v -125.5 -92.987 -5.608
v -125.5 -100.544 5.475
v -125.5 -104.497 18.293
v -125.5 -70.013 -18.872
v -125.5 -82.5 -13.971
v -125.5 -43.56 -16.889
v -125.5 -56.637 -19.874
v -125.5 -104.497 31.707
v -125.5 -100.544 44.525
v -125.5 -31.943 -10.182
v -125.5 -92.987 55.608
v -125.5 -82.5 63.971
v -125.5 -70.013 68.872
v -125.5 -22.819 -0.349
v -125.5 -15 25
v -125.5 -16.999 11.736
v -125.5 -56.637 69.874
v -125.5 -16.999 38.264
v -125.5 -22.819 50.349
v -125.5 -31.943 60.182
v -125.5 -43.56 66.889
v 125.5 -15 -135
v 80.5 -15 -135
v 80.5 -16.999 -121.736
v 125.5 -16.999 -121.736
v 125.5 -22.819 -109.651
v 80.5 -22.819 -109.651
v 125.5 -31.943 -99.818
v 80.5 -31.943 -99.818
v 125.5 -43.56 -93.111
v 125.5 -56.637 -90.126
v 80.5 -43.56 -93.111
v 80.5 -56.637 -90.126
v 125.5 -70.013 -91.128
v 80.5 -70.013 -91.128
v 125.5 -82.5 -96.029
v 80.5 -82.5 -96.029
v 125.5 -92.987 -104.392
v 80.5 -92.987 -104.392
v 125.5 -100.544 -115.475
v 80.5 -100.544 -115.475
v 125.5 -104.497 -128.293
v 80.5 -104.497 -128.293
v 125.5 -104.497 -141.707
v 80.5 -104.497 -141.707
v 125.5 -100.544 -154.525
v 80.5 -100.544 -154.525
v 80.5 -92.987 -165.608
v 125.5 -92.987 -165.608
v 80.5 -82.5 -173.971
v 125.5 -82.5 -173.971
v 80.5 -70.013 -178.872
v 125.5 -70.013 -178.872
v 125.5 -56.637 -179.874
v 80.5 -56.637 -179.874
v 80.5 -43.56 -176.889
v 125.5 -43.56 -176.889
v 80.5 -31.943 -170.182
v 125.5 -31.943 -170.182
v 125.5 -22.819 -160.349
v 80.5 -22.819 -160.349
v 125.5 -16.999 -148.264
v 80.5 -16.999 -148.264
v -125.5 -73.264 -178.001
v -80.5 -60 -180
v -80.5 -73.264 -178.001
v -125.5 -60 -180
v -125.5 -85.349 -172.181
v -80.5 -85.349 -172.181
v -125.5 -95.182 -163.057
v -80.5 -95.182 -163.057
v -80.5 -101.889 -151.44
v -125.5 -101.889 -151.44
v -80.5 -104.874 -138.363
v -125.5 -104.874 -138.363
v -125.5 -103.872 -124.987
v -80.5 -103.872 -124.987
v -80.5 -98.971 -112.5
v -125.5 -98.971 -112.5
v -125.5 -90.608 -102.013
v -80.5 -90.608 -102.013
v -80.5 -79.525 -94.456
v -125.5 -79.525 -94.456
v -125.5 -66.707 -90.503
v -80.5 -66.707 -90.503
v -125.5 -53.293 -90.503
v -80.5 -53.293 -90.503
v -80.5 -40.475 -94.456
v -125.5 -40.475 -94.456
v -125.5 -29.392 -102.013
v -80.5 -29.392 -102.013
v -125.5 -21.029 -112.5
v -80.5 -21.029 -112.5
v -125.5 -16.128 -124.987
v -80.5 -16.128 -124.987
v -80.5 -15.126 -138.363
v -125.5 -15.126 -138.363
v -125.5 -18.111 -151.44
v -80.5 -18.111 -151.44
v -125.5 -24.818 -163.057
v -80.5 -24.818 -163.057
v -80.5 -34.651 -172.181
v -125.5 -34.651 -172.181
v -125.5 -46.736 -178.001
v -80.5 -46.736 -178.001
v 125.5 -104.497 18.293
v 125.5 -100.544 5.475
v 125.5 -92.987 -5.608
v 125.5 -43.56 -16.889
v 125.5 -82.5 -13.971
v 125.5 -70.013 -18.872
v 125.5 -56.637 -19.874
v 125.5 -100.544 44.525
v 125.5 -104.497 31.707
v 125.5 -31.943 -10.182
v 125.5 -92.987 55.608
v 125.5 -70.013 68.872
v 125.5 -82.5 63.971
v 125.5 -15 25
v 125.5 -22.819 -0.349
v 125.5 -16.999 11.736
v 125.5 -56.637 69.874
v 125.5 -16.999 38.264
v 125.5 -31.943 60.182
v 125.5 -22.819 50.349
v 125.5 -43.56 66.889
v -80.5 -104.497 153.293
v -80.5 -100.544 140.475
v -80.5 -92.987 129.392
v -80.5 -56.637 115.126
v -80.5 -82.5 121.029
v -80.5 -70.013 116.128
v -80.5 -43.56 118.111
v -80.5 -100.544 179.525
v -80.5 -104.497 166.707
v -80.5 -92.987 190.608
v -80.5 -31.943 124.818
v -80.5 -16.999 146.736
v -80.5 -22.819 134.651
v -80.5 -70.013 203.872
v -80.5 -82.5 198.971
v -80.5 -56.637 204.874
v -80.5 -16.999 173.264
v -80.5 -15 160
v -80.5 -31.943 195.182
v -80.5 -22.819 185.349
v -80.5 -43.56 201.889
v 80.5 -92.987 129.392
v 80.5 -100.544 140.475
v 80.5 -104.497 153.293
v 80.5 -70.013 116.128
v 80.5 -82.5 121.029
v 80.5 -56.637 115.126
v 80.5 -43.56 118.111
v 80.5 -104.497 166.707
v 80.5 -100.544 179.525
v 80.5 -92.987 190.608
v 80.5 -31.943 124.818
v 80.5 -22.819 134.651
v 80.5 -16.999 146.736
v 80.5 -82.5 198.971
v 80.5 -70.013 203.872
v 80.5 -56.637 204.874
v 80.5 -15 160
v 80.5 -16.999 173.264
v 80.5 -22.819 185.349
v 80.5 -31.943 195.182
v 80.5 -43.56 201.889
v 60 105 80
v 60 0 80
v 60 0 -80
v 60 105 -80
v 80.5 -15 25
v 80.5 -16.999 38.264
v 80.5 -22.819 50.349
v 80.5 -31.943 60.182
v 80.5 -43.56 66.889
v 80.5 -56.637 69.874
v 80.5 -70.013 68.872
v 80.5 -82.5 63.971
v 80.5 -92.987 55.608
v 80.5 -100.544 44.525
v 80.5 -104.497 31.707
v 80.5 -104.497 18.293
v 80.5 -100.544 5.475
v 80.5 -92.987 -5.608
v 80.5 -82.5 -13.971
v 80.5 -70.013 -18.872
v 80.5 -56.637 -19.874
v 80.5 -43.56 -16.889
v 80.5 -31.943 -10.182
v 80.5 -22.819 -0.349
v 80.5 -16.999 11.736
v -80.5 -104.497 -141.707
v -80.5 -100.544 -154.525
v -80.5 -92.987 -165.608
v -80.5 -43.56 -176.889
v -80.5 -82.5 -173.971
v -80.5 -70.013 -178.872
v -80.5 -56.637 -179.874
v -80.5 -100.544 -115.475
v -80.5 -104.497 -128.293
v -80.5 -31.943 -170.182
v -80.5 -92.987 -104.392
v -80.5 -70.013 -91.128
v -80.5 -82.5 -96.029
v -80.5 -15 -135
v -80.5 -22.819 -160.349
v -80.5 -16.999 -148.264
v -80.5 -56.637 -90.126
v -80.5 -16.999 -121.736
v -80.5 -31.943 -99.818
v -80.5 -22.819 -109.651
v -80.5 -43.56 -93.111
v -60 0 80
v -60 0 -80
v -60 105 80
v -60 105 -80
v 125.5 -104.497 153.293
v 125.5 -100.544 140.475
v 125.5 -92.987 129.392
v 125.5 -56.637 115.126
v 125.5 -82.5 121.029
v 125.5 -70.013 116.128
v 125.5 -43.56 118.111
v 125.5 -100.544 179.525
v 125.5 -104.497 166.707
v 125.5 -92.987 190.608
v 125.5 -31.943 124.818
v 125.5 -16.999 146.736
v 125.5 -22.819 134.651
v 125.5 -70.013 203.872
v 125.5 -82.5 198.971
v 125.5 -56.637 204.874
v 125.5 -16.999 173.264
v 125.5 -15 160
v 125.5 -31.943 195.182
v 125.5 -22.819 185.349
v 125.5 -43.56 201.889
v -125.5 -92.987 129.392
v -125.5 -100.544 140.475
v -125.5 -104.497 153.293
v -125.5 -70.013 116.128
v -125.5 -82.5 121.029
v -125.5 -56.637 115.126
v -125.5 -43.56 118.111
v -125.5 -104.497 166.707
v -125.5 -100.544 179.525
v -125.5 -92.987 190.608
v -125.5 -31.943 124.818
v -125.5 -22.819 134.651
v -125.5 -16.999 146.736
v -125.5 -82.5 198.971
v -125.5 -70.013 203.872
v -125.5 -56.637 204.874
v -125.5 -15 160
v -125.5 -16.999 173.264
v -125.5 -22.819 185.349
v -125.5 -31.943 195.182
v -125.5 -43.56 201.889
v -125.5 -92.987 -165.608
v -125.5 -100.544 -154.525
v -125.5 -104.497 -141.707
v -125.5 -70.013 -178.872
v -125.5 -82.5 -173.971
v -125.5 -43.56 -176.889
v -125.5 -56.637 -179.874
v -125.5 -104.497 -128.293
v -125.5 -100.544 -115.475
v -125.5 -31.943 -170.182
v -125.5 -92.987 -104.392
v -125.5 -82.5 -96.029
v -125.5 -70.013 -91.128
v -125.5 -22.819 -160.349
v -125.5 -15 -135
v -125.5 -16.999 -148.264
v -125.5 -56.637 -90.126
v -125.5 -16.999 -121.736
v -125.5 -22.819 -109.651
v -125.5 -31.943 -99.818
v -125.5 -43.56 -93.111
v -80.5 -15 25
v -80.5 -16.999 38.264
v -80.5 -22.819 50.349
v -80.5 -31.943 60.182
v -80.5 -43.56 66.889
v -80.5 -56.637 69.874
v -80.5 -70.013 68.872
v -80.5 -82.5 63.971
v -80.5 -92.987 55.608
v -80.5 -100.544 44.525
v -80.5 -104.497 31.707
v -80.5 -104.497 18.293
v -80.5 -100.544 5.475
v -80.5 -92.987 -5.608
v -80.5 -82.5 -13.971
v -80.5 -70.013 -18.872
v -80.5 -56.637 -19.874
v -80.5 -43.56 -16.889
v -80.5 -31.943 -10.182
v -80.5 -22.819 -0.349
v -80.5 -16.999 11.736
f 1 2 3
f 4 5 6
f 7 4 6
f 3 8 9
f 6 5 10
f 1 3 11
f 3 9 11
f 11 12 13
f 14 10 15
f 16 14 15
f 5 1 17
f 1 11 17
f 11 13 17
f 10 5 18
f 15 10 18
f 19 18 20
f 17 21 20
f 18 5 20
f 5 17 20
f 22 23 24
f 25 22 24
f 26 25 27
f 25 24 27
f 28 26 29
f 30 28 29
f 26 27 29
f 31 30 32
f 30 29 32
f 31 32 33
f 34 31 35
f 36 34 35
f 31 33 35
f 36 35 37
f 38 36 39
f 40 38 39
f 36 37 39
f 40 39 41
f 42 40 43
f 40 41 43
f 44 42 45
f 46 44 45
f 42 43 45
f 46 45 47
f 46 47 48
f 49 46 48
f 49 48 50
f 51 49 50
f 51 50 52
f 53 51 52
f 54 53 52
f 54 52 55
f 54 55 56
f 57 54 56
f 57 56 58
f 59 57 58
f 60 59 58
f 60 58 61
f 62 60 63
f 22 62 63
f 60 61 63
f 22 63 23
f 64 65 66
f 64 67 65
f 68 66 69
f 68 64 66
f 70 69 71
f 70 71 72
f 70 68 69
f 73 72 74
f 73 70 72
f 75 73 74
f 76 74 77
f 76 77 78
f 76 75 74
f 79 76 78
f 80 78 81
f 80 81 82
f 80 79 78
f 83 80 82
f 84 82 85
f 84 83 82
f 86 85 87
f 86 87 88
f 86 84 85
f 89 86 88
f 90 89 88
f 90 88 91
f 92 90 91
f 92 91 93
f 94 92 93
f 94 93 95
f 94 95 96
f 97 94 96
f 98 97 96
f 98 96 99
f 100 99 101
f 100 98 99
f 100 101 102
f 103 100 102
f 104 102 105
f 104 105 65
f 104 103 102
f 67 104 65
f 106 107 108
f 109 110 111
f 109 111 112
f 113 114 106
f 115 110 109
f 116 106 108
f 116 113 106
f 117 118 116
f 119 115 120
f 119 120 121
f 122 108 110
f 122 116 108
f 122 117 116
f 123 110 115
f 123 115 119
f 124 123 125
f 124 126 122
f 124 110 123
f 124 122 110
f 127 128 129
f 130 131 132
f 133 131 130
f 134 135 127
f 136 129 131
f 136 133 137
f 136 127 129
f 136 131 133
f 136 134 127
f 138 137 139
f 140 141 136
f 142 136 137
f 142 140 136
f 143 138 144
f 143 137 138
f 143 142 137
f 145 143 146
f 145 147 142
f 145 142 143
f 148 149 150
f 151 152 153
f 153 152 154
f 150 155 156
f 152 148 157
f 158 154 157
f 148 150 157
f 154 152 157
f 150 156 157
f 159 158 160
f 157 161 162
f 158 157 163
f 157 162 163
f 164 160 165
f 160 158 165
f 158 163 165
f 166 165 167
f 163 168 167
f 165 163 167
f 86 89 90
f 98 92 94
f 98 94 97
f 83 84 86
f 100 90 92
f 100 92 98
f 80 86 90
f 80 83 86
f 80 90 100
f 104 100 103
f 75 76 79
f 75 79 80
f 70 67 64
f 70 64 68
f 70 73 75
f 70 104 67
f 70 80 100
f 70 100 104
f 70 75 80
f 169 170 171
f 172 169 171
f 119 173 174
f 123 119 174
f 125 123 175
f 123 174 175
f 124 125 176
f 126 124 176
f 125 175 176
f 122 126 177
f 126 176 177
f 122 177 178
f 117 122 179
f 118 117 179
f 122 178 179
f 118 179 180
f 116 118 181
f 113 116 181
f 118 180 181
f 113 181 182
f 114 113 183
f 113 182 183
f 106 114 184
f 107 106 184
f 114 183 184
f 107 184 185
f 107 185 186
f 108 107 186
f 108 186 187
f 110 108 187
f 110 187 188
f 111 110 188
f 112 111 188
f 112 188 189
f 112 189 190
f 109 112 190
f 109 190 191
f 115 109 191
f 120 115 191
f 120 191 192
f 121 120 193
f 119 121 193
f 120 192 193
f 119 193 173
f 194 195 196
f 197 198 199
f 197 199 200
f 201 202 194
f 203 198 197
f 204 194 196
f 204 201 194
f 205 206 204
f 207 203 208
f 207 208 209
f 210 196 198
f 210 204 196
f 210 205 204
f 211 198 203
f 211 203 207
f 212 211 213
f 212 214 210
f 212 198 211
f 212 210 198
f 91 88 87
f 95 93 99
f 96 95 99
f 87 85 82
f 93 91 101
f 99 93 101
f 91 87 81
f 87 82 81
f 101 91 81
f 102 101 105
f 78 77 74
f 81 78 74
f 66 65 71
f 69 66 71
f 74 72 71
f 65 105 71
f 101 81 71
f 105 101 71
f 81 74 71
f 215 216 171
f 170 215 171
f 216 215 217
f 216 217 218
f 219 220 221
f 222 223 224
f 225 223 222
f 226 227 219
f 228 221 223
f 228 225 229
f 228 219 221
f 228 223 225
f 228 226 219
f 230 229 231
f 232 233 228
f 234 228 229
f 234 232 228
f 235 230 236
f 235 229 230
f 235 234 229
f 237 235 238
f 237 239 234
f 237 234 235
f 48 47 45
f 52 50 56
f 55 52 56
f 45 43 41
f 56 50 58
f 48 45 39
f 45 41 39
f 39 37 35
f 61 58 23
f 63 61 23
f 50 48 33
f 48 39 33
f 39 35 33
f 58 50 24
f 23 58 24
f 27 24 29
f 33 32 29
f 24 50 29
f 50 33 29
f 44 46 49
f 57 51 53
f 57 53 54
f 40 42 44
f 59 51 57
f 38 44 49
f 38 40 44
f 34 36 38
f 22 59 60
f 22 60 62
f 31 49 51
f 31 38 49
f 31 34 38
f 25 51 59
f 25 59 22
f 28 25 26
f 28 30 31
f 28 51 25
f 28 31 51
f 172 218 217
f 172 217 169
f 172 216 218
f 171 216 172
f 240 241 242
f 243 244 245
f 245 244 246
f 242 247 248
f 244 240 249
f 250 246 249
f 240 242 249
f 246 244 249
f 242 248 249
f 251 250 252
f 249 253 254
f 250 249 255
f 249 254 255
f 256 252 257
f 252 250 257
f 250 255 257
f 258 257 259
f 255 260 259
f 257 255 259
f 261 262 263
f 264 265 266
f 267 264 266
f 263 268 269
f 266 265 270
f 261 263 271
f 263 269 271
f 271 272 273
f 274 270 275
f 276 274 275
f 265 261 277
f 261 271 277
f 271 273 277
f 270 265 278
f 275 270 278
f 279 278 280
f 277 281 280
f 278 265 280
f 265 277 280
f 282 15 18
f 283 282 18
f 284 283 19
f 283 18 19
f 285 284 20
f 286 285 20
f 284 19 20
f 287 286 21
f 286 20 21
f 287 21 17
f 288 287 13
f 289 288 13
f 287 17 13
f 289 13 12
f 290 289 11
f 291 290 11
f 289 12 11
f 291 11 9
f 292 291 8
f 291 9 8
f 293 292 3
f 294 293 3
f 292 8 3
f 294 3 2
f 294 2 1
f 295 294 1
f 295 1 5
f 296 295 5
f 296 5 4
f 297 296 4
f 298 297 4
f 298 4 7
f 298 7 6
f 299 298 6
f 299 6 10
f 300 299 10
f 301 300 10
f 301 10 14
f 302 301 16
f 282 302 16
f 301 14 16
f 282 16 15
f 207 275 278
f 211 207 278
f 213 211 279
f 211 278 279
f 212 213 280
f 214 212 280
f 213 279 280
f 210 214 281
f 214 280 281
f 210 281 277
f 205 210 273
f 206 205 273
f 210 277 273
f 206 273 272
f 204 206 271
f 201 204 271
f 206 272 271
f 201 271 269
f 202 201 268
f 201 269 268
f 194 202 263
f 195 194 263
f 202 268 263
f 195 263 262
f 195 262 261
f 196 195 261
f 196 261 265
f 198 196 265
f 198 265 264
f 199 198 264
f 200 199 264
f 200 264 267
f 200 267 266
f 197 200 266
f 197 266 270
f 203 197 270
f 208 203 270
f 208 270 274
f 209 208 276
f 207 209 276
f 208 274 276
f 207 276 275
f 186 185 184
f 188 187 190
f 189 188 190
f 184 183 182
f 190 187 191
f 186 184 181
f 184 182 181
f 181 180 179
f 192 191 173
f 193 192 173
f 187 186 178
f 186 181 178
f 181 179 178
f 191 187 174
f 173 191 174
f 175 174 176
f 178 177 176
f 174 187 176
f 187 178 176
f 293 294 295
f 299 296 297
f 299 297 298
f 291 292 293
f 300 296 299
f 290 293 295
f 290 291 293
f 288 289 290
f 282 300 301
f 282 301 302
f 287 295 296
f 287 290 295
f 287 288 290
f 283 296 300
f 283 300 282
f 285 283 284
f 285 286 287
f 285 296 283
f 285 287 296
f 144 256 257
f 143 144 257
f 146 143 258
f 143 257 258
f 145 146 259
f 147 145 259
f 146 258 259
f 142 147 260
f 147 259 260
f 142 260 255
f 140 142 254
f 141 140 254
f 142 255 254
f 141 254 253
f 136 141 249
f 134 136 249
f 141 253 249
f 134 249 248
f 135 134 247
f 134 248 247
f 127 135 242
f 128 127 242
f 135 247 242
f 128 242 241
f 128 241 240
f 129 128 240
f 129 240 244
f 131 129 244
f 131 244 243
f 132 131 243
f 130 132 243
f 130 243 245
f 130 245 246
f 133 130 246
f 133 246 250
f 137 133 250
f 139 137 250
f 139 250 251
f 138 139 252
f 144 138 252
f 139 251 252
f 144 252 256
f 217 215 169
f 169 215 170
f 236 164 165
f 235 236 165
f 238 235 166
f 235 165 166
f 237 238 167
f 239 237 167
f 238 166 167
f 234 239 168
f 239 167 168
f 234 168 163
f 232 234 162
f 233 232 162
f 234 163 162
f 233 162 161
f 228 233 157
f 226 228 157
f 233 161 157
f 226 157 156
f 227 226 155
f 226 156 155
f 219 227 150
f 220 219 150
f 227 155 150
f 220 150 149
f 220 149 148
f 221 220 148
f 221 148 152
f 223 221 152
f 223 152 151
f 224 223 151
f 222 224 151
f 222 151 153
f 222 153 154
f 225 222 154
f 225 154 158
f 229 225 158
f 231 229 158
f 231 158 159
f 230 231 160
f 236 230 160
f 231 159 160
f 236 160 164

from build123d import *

# Parameters (mm, degrees)
SKETCH1_W                   = 120
SKETCH1_H                   = 160
BOSS_EXTRUDE1_DEPTH         = 105
SKETCH2_R                   = 45
BOSS_EXTRUDE2_DEPTH         = 22.5
SKETCH_PATTERN2_START       = 80.5
SKETCH_PATTERN2_OUTLINE_R   = 45
SKETCH_PATTERN2_DEPTH       = 45
SKETCH_PATTERN2_2_OUTLINE_R = 45
SKETCH_PATTERN2_2_DEPTH     = 45
SKETCH_PATTERN2_3_OUTLINE_R = 45
SKETCH_PATTERN2_3_DEPTH     = 45
SKETCH_PATTERN2_START_2     = -125.5
SKETCH_PATTERN2_4_OUTLINE_R = 45
SKETCH_PATTERN2_4_DEPTH     = 45
SKETCH_PATTERN2_5_OUTLINE_R = 45
SKETCH_PATTERN2_5_DEPTH     = 45
SKETCH_PATTERN2_6_OUTLINE_R = 45
SKETCH_PATTERN2_6_DEPTH     = 45


# Read off the part's stored shape, not the designer's step: Sketch-Pattern2
with BuildPart() as part:
    # Sketch1 → Boss-Extrude1 (new body)
    with BuildSketch(Plane(origin=(0, 0, 0), x_dir=(1, 0, 0), z_dir=(0, 1, 0))):
        Rectangle(SKETCH1_W, SKETCH1_H)
    extrude(amount=BOSS_EXTRUDE1_DEPTH)


with BuildPart() as body_2:
    # Sketch2 → Boss-Extrude2 (new, symmetric)
    with BuildSketch(Plane.ZY.offset(103)):
        with Locations(Location((-135, -60, 0), (0, 0, 180))):
            Circle(SKETCH2_R)
    extrude(amount=BOSS_EXTRUDE2_DEPTH, both=True)


with BuildPart() as body_3:
    # Sketch-Pattern2 outline → Sketch-Pattern2 (new body)
    with BuildSketch(Plane.YZ.offset(SKETCH_PATTERN2_START)):
        with Locations((-60, -135)):
            Circle(SKETCH_PATTERN2_OUTLINE_R)
    extrude(amount=SKETCH_PATTERN2_DEPTH)


with BuildPart() as body_4:
    # Sketch-Pattern2 2 outline → Sketch-Pattern2 2 (new body)
    with BuildSketch(Plane.YZ.offset(SKETCH_PATTERN2_START)):
        with Locations((-60, 25)):
            Circle(SKETCH_PATTERN2_2_OUTLINE_R)
    extrude(amount=SKETCH_PATTERN2_2_DEPTH)


with BuildPart() as body_5:
    # Sketch-Pattern2 3 outline → Sketch-Pattern2 3 (new body)
    with BuildSketch(Plane.YZ.offset(SKETCH_PATTERN2_START)):
        with Locations((-60, 160)):
            Circle(SKETCH_PATTERN2_3_OUTLINE_R)
    extrude(amount=SKETCH_PATTERN2_3_DEPTH)


with BuildPart() as body_6:
    # Sketch-Pattern2 4 outline → Sketch-Pattern2 4 (new body)
    with BuildSketch(Plane.YZ.offset(SKETCH_PATTERN2_START_2)):
        with Locations((-60, 160)):
            Circle(SKETCH_PATTERN2_4_OUTLINE_R)
    extrude(amount=SKETCH_PATTERN2_4_DEPTH)


with BuildPart() as body_7:
    # Sketch-Pattern2 5 outline → Sketch-Pattern2 5 (new body)
    with BuildSketch(Plane.YZ.offset(SKETCH_PATTERN2_START_2)):
        with Locations((-60, 25)):
            Circle(SKETCH_PATTERN2_5_OUTLINE_R)
    extrude(amount=SKETCH_PATTERN2_5_DEPTH)


with BuildPart() as body_8:
    # Sketch-Pattern2 6 outline → Sketch-Pattern2 6 (new body)
    with BuildSketch(Plane.YZ.offset(SKETCH_PATTERN2_START_2)):
        with Locations((-60, -135)):
            Circle(SKETCH_PATTERN2_6_OUTLINE_R)
    extrude(amount=SKETCH_PATTERN2_6_DEPTH)


solid = Compound([part.part, body_2.part, body_3.part, body_4.part, body_5.part, body_6.part, body_7.part, body_8.part])
